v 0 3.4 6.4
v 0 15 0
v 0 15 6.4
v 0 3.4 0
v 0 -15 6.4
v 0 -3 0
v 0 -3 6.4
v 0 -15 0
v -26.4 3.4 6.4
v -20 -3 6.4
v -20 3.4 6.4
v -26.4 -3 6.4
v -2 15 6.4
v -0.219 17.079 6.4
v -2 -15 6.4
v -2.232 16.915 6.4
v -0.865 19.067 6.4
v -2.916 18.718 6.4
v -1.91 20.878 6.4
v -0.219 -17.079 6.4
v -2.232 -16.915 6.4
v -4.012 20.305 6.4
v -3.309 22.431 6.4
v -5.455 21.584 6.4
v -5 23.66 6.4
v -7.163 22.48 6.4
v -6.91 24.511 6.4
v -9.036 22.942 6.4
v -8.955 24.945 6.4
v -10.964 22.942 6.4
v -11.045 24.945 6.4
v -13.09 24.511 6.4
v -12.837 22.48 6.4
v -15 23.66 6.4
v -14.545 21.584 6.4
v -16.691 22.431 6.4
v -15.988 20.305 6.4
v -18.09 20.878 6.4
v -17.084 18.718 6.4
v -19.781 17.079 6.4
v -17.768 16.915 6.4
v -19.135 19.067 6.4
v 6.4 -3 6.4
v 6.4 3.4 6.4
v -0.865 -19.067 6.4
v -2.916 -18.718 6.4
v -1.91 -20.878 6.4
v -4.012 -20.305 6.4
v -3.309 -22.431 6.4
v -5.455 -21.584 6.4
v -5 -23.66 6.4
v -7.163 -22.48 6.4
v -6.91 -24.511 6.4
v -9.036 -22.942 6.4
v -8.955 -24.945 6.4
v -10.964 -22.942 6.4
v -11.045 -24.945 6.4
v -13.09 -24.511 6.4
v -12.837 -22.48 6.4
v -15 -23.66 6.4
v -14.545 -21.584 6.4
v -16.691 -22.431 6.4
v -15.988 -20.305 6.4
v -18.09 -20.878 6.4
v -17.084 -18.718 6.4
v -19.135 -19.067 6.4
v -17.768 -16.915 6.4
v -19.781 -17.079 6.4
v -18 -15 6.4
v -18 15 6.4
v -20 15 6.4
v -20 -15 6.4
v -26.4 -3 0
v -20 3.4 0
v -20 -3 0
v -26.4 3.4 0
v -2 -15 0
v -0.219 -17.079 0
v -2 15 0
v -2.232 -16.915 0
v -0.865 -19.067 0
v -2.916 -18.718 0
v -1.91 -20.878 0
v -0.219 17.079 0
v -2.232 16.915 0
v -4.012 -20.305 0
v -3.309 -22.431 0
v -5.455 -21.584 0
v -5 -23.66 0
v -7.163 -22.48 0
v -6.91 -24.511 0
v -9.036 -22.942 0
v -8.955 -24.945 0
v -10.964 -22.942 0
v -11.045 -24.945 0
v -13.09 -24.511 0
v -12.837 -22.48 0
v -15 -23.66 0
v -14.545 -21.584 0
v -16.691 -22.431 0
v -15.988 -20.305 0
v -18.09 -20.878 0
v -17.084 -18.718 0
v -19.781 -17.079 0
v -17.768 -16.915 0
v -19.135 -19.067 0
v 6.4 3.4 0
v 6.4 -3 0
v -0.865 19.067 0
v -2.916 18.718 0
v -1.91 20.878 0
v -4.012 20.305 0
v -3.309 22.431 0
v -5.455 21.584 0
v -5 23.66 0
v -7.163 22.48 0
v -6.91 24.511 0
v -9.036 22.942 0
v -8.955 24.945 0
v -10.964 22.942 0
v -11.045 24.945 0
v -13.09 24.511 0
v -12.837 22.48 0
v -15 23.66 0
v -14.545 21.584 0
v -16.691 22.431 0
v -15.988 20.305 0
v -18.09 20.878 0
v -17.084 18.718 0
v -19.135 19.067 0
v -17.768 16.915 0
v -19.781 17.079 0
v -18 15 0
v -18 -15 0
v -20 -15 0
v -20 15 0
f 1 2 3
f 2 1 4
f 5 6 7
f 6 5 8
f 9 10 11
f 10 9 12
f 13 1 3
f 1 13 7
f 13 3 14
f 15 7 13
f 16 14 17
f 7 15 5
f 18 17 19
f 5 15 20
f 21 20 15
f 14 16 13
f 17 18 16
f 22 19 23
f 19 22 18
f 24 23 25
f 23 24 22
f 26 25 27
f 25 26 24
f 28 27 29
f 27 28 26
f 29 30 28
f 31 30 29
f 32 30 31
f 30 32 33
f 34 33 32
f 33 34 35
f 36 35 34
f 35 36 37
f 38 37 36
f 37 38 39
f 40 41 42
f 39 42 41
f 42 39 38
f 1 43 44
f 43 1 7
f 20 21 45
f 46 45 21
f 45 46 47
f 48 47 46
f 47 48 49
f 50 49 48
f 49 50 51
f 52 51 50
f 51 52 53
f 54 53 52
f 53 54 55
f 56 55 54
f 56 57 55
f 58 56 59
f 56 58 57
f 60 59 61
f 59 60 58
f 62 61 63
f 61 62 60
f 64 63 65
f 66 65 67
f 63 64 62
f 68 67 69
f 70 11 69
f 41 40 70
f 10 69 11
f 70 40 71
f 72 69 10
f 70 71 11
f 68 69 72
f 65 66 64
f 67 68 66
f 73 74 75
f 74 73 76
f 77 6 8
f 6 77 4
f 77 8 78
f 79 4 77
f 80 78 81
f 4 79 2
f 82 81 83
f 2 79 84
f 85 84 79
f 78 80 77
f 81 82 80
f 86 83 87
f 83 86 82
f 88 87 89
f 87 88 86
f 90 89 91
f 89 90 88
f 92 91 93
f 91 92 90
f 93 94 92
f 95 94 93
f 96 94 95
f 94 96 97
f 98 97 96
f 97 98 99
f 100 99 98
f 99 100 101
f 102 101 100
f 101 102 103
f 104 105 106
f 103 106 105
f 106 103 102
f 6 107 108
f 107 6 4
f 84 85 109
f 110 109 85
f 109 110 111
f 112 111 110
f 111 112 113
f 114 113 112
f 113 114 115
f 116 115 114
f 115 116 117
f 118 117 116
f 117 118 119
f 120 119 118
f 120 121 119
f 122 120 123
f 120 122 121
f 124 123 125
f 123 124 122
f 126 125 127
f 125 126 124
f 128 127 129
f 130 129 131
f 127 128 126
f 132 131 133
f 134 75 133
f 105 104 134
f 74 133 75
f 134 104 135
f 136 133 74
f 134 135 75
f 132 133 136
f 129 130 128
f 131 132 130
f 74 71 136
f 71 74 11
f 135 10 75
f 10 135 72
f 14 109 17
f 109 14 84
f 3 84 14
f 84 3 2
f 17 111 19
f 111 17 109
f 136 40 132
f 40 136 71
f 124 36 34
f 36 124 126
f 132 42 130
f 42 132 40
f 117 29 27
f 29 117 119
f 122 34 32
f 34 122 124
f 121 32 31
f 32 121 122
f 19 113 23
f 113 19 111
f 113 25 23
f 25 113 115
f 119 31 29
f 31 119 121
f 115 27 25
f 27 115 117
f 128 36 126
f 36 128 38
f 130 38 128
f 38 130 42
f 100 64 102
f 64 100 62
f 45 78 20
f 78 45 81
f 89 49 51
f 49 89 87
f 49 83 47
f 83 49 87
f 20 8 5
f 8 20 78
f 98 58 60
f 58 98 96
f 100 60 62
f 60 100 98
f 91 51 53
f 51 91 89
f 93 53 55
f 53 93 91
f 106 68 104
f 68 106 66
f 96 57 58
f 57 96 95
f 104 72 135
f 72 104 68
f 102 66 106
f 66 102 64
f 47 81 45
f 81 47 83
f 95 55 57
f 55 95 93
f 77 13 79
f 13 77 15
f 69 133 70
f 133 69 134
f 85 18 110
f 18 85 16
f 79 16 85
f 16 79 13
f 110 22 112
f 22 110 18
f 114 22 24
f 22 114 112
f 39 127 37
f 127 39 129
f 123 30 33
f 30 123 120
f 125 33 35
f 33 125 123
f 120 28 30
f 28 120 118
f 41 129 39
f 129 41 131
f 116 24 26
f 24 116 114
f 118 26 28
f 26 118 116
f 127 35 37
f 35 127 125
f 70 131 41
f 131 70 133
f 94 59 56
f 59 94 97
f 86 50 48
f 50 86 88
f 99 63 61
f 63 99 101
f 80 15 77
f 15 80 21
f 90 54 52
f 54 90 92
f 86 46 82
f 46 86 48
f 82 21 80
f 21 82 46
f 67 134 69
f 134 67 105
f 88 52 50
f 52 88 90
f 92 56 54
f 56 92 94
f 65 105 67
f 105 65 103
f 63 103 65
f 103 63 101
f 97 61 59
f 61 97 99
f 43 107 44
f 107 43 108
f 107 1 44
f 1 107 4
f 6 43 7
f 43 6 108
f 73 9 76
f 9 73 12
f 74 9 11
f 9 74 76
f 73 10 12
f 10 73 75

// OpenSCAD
th=2;
w = 6.4;

translate([0,-3,0])
cube(w);

translate([-20-w,-3,0])
cube(w);

difference()
{
translate([-10,0,0])
union()
{
  translate([-10,-15,0])
  cube([20,30,w]);
  
  translate([0,15,0])
  cylinder(h=w, r=10, center=false);


  translate([0,-15,0])
  cylinder(h=w, r=10, center=false);

}


translate([-10,0,-.1])

union()
{
  translate([-10+th,-15,0])
  cube([20-2*th,30,6+th]);
  
  translate([0,15,0])
  cylinder(h=w+th, r=10-th, center=false);


  translate([0,-15,0])
  cylinder(h=w+th, r=10-th, center=false);

}

}
